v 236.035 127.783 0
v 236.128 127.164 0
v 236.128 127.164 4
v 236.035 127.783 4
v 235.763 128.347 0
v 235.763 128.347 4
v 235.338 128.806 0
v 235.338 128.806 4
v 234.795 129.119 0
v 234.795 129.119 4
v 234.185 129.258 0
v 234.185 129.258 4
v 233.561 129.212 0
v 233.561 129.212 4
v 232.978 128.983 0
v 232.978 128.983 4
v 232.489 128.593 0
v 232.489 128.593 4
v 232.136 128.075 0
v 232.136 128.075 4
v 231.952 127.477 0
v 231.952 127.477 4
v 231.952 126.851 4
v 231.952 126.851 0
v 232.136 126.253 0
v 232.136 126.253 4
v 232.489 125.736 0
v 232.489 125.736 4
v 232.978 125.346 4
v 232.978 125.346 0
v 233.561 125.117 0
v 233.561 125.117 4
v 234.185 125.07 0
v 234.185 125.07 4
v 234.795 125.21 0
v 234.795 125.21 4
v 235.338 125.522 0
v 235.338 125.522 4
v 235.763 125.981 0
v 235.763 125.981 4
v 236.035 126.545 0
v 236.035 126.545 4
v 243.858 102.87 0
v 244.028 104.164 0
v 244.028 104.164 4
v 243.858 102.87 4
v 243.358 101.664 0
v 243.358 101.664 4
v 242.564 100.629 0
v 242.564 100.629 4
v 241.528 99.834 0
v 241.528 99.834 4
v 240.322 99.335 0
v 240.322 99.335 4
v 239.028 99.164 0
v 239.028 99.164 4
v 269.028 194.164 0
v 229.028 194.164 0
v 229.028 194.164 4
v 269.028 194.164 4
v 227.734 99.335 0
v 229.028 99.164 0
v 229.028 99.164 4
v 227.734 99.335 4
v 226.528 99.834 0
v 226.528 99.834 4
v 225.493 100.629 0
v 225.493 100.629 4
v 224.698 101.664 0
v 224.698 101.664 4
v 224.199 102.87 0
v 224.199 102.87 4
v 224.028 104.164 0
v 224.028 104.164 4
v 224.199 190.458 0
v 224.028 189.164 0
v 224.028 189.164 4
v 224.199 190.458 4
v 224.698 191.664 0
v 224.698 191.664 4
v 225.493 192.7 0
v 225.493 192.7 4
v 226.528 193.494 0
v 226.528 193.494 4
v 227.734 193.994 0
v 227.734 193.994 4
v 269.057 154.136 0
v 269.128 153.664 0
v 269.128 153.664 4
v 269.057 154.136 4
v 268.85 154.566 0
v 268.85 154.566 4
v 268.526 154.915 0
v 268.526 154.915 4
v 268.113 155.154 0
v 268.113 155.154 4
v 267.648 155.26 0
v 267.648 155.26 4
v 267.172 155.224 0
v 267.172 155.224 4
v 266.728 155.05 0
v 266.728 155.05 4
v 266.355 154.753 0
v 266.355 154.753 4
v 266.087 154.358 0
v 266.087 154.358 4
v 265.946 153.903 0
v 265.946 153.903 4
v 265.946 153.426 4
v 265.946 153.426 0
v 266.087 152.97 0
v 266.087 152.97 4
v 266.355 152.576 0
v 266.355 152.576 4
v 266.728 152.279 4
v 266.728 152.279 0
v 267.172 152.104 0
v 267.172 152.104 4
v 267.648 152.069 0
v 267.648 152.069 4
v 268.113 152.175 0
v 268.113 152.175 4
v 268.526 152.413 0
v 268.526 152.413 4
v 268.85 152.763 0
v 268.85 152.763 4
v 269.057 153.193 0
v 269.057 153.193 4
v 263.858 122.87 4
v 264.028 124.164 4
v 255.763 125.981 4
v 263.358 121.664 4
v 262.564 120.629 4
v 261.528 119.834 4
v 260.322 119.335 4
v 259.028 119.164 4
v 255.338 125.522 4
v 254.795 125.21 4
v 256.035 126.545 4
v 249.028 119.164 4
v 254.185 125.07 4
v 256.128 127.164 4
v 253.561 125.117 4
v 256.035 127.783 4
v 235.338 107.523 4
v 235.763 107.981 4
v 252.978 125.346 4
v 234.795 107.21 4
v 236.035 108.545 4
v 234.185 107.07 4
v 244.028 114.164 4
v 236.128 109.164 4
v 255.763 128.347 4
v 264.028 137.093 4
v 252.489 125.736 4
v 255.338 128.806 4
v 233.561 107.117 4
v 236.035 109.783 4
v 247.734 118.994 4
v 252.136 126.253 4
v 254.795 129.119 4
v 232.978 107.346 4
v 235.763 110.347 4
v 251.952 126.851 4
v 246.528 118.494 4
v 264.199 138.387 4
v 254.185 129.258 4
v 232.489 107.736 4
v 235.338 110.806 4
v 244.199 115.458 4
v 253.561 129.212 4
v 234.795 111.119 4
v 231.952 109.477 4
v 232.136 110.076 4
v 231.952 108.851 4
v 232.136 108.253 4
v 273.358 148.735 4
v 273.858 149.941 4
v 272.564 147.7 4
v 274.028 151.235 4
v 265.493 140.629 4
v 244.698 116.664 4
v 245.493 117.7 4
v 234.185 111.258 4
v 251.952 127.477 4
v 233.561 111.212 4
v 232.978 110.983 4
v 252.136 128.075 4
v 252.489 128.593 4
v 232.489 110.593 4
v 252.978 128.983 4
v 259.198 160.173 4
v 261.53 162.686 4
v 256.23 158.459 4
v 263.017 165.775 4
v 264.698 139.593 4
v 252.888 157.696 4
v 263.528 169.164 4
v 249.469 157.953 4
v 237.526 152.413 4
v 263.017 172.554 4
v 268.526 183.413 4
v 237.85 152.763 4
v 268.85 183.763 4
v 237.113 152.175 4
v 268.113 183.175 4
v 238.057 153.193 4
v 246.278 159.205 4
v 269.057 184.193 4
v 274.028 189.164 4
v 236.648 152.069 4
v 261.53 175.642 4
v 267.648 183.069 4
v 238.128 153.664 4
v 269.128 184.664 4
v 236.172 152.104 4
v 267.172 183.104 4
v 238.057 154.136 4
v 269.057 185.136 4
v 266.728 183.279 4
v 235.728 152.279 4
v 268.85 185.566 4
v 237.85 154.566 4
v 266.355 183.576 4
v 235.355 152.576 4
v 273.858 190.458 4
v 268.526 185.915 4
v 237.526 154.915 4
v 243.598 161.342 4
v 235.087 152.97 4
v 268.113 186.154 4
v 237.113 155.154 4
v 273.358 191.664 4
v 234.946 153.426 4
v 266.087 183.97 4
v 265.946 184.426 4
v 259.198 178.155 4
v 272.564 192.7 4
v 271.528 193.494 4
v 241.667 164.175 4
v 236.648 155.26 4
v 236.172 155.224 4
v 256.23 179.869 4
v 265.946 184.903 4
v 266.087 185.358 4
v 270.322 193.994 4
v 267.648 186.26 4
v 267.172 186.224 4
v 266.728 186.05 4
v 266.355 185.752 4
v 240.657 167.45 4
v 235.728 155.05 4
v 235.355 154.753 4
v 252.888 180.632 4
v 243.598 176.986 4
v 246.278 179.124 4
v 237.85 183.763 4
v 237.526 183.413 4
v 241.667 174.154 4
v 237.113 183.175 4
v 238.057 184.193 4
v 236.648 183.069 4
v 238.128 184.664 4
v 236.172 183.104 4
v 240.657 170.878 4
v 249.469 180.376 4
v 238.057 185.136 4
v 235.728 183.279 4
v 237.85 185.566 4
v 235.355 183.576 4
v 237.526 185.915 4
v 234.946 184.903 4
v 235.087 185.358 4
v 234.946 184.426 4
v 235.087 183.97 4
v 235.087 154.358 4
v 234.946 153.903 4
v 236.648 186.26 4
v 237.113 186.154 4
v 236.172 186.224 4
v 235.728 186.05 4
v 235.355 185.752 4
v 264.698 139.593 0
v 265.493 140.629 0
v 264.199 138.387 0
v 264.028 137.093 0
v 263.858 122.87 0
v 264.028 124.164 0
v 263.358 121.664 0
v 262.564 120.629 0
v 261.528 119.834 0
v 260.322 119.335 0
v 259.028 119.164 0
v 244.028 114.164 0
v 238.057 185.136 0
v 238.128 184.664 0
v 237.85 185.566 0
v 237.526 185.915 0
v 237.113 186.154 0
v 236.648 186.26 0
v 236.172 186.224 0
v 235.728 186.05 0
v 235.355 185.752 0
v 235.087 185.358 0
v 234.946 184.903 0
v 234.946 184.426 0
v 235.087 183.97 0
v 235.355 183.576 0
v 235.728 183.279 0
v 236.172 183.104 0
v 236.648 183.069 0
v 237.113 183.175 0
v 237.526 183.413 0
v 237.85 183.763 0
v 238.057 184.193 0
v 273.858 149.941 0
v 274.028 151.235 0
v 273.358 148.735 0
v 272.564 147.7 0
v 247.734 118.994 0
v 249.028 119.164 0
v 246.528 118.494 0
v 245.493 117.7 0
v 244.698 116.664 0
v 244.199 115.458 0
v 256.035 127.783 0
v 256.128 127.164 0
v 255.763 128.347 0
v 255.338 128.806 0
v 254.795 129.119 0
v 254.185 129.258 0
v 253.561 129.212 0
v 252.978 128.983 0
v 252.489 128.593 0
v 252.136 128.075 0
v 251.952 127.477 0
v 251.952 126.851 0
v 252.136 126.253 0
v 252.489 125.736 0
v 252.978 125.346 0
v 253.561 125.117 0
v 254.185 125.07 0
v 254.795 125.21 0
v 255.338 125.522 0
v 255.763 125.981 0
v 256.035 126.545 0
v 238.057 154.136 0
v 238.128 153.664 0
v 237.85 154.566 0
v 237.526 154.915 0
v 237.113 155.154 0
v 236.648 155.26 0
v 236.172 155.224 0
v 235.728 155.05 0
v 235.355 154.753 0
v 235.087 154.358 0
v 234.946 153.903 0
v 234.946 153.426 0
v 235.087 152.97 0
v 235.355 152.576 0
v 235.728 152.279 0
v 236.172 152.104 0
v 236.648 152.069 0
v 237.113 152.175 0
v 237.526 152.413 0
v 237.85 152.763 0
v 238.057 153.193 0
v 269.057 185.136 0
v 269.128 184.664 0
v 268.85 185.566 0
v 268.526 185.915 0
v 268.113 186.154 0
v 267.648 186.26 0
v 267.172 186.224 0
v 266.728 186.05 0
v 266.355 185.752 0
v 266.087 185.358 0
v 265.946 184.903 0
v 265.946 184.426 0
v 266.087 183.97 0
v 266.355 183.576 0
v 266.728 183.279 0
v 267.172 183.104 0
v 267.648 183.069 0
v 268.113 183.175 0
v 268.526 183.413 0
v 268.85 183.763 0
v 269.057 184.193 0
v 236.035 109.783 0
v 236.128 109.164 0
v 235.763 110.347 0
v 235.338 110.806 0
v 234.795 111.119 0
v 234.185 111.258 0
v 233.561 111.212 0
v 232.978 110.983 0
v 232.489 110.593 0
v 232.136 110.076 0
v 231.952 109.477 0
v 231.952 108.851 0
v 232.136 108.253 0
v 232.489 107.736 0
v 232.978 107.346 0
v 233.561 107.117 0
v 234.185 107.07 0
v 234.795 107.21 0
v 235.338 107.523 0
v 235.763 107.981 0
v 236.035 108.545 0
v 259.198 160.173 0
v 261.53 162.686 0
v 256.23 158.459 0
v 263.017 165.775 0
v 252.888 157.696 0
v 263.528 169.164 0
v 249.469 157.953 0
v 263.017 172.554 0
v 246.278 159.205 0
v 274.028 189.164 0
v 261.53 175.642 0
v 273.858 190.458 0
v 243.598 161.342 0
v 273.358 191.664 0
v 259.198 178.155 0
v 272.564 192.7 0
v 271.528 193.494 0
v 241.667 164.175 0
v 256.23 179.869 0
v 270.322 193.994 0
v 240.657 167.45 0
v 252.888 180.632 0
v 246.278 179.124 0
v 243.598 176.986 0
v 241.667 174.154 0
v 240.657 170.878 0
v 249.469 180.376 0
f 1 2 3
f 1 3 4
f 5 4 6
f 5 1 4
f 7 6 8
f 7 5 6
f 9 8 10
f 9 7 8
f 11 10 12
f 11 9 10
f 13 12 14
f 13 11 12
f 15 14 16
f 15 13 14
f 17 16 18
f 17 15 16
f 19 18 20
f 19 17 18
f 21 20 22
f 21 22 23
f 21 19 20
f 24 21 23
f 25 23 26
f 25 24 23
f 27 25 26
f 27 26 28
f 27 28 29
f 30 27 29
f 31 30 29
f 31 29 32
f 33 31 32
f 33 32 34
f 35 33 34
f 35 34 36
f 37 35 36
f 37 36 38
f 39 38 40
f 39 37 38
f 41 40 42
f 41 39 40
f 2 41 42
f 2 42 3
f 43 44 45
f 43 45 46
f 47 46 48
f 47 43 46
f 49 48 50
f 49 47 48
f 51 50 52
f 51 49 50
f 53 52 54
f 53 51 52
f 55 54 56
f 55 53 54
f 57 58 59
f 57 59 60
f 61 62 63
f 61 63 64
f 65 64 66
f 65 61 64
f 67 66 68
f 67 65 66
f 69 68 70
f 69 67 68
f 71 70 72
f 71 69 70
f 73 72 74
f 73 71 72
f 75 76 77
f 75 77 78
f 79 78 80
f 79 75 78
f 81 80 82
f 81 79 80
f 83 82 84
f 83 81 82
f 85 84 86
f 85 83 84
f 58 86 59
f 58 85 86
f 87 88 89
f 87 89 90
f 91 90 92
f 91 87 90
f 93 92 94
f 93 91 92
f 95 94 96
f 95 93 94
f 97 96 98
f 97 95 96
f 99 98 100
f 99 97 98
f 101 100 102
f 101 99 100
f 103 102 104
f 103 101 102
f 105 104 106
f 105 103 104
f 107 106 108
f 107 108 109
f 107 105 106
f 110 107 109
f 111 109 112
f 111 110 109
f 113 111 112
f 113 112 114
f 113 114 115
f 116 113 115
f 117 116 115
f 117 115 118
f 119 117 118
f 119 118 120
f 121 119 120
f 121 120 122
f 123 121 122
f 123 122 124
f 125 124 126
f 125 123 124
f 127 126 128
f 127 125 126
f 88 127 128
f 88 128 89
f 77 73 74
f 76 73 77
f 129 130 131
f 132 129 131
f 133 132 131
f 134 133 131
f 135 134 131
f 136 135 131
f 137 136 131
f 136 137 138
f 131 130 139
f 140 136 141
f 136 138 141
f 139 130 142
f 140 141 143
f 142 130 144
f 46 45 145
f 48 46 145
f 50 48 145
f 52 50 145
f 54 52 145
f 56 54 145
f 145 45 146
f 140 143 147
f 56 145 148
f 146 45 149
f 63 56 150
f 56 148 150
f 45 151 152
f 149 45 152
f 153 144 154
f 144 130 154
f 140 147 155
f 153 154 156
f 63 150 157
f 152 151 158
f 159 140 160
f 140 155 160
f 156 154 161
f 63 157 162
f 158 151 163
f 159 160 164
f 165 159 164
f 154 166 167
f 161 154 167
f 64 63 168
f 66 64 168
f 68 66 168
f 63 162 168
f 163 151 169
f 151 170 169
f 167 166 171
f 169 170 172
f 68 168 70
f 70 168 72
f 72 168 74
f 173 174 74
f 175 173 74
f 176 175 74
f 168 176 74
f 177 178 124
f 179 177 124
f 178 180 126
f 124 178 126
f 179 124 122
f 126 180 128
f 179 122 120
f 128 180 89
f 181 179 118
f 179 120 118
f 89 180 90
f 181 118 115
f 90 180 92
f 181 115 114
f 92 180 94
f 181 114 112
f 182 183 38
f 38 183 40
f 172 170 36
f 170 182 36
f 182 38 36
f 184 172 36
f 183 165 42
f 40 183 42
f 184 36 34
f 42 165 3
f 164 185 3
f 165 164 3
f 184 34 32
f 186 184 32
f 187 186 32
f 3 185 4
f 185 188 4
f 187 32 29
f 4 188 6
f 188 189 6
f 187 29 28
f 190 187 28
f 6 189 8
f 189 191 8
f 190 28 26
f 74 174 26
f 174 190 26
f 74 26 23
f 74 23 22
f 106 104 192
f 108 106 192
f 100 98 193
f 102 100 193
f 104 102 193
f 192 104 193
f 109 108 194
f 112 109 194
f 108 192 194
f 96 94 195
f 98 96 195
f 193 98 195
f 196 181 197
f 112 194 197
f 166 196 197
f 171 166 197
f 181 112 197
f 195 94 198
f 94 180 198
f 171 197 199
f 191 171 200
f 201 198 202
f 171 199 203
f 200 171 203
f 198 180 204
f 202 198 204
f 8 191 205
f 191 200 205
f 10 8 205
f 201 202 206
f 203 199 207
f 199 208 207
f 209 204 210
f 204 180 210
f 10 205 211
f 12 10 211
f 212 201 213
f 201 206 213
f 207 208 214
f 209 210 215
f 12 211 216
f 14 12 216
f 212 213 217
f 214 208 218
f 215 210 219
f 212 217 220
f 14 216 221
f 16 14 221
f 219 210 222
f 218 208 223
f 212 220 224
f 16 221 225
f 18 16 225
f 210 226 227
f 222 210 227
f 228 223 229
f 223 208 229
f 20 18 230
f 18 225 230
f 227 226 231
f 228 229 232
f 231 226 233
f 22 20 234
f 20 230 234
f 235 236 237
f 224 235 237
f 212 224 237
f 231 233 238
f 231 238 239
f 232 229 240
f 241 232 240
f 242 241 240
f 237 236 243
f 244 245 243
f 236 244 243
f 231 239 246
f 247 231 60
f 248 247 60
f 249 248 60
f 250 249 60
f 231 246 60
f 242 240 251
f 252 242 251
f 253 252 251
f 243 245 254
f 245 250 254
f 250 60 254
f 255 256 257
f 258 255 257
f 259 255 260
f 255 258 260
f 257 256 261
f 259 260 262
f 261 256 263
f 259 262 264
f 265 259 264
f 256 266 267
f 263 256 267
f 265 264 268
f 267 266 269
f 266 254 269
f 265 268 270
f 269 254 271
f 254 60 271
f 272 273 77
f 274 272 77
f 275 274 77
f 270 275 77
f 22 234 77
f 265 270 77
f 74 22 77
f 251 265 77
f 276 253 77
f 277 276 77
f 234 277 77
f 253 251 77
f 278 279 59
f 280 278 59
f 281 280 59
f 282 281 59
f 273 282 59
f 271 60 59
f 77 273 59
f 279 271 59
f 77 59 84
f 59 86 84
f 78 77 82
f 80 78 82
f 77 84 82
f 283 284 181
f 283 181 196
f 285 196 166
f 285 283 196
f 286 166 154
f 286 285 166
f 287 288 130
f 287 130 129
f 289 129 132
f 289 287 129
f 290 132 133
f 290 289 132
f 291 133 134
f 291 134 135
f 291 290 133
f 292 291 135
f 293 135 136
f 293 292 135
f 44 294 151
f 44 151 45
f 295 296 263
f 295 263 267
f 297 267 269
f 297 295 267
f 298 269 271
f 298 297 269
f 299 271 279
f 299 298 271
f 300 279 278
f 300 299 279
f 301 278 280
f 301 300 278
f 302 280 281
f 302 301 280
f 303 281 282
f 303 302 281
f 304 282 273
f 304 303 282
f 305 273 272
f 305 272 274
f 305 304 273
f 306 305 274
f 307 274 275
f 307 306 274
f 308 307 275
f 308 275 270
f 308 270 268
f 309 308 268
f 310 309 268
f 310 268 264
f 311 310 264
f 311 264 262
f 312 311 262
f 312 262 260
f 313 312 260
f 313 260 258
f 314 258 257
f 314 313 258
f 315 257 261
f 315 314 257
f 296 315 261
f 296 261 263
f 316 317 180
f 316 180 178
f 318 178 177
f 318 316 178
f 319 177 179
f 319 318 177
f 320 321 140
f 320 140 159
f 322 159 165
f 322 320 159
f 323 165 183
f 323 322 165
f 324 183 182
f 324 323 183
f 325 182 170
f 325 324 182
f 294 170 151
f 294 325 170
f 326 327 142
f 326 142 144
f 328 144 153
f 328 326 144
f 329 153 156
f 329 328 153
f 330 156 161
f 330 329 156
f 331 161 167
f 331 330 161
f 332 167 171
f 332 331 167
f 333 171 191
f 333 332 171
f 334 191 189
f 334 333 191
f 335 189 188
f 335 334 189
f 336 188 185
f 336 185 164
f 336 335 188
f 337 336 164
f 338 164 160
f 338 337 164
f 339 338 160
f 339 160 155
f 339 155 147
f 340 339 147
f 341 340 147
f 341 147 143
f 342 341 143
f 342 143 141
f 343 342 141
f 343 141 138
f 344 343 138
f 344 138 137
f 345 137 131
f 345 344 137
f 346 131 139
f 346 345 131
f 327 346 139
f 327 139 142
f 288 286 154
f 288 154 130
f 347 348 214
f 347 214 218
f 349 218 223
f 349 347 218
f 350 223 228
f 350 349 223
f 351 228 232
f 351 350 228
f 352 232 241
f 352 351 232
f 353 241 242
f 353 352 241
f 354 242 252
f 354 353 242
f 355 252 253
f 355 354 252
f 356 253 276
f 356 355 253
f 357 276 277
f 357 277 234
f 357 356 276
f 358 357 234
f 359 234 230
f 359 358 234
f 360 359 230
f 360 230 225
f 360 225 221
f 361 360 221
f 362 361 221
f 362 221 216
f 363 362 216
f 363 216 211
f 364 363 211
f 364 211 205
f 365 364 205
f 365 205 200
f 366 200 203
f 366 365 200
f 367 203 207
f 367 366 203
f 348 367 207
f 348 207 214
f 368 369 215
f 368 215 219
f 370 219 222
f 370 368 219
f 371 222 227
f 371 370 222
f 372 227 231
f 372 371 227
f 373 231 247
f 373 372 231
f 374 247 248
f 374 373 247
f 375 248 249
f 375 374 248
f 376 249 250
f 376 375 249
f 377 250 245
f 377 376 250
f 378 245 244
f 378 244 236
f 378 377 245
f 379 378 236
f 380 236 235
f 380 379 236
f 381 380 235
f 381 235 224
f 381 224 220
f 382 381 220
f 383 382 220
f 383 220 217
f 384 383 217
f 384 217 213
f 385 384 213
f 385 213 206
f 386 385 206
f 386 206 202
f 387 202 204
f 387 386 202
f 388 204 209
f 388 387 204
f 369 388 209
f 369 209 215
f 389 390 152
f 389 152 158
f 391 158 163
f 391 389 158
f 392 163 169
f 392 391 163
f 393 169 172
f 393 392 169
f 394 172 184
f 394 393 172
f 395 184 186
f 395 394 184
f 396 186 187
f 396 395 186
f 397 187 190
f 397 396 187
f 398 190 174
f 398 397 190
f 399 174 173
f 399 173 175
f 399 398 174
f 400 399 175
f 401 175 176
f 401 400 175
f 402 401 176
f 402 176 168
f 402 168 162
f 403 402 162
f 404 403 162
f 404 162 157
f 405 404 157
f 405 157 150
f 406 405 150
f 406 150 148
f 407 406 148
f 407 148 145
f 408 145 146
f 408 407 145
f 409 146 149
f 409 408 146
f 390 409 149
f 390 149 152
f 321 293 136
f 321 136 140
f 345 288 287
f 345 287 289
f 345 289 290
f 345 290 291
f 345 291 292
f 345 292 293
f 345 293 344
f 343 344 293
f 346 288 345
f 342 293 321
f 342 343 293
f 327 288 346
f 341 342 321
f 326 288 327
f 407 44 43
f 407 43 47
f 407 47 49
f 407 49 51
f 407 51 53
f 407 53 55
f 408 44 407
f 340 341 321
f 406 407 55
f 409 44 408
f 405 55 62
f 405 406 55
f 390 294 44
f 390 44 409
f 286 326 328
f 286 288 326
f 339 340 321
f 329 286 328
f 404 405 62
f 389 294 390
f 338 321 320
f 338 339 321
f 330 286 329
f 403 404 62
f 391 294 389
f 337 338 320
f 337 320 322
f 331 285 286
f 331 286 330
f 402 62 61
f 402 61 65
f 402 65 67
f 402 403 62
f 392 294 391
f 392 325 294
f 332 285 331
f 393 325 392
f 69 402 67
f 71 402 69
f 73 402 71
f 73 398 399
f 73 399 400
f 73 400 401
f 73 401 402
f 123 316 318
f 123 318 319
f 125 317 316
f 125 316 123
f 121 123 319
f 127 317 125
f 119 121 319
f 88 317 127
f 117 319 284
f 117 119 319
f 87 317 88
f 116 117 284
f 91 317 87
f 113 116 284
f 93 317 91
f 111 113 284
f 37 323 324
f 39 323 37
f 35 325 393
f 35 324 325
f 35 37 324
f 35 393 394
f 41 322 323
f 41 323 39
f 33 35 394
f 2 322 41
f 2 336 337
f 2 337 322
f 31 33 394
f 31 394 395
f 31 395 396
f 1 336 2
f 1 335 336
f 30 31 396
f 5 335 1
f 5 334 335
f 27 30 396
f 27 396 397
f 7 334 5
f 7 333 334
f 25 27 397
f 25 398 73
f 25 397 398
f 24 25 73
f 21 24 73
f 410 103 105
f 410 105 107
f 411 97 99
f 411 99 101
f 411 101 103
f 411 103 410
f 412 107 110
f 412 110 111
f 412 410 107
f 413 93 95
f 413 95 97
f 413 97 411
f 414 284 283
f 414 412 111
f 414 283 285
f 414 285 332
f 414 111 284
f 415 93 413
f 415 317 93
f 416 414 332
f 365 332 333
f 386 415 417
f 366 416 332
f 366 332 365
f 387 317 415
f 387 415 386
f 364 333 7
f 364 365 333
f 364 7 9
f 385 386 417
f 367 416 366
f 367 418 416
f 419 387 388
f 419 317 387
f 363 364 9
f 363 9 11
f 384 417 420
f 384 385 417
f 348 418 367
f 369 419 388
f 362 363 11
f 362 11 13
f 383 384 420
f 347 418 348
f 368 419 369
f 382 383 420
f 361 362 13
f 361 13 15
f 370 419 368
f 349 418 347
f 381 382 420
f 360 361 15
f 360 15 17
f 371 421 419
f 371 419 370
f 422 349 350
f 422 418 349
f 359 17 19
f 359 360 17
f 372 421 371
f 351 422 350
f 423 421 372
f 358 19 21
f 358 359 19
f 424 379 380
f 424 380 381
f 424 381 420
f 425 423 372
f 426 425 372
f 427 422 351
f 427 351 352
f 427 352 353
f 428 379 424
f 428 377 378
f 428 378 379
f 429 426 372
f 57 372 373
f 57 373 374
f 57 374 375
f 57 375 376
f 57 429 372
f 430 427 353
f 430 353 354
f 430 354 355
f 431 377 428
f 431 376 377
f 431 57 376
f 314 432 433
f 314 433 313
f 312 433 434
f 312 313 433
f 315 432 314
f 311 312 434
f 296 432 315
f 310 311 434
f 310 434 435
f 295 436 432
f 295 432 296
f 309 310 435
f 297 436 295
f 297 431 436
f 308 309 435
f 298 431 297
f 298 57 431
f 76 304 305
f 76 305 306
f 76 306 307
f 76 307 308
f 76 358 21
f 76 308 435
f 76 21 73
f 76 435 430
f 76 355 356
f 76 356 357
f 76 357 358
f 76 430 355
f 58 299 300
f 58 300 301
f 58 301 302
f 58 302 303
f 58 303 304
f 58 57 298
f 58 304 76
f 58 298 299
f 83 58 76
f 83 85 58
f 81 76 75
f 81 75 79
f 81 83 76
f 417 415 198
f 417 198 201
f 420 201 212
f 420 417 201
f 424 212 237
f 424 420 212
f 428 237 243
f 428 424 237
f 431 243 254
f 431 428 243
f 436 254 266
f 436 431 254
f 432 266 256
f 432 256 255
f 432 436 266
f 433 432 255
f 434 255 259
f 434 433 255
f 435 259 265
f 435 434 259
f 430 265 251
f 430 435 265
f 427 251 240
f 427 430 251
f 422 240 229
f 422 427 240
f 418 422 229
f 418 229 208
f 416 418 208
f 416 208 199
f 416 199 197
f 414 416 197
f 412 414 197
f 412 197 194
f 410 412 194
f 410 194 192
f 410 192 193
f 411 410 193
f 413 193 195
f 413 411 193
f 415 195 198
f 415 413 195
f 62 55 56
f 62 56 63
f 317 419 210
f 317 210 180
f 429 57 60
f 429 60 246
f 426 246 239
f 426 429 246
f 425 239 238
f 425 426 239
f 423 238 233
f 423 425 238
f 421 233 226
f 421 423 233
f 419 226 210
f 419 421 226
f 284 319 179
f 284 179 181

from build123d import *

# Parameters (mm, degrees)
MODEL_R         = 1.5999968
MODEL_R_2       = 2.0999958
MODEL_R_3       = 11.499977
EXTRUDE_1_DEPTH = 4


with BuildPart() as part:
    # Model → Бобышка-Вытянуть1 (new body)
    with BuildSketch(Plane.XY):
        with BuildLine():
            Line((274.028195208, 189.164211852), (274.028195208, 151.235355522))
            ThreePointArc((274.028195208, 151.235355522), (273.647593631, 149.321942187), (272.563732042, 147.699828687))
            Line((272.563732042, 147.699828687), (265.492678373, 140.628775017))
            ThreePointArc((265.492678373, 140.628775017), (264.408816784, 139.006661518), (264.028215208, 137.093248183))
            Line((264.028215208, 137.093248183), (264.028215208, 124.164341852))
            ThreePointArc((264.028215208, 124.164341852), (262.563752042, 120.628815017), (259.028225208, 119.164351852))
            Line((259.028225208, 119.164351852), (249.028245208, 119.164351852))
            ThreePointArc((249.028245208, 119.164351852), (245.492718373, 117.699888687), (244.028255208, 114.164361852))
            Line((244.028255208, 114.164361852), (244.028255208, 104.164381852))
            ThreePointArc((244.028255208, 104.164381852), (242.563792042, 100.628855017), (239.028265208, 99.164391852))
            Line((239.028265208, 99.164391852), (229.028285208, 99.164391852))
            ThreePointArc((229.028285208, 99.164391852), (225.492758373, 100.628855017), (224.028295208, 104.164381852))
            Line((224.028295208, 104.164381852), (224.028295208, 189.164211852))
            ThreePointArc((224.028295208, 189.164211852), (225.492758373, 192.699738687), (229.028285208, 194.164201852))
            Line((229.028285208, 194.164201852), (269.028205208, 194.164201852))
            ThreePointArc((269.028205208, 194.164201852), (272.563732043, 192.699738687), (274.028195208, 189.164211852))
        make_face()
        with Locations((267.528208208, 184.664220852)):
            Circle(MODEL_R, mode=Mode.SUBTRACT)
        with Locations((267.528208208, 153.664282852)):
            Circle(MODEL_R, mode=Mode.SUBTRACT)
        with Locations((236.528270208, 153.664282852)):
            Circle(MODEL_R, mode=Mode.SUBTRACT)
        with Locations((236.528270208, 184.664220852)):
            Circle(MODEL_R, mode=Mode.SUBTRACT)
        with Locations((254.028235208, 127.164335852)):
            Circle(MODEL_R_2, mode=Mode.SUBTRACT)
        with Locations((234.028275208, 127.164335852)):
            Circle(MODEL_R_2, mode=Mode.SUBTRACT)
        with Locations((234.028275208, 109.164371852)):
            Circle(MODEL_R_2, mode=Mode.SUBTRACT)
        with Locations((252.028239208, 169.164251852)):
            Circle(MODEL_R_3, mode=Mode.SUBTRACT)
    extrude(amount=EXTRUDE_1_DEPTH)


solid = part.part
